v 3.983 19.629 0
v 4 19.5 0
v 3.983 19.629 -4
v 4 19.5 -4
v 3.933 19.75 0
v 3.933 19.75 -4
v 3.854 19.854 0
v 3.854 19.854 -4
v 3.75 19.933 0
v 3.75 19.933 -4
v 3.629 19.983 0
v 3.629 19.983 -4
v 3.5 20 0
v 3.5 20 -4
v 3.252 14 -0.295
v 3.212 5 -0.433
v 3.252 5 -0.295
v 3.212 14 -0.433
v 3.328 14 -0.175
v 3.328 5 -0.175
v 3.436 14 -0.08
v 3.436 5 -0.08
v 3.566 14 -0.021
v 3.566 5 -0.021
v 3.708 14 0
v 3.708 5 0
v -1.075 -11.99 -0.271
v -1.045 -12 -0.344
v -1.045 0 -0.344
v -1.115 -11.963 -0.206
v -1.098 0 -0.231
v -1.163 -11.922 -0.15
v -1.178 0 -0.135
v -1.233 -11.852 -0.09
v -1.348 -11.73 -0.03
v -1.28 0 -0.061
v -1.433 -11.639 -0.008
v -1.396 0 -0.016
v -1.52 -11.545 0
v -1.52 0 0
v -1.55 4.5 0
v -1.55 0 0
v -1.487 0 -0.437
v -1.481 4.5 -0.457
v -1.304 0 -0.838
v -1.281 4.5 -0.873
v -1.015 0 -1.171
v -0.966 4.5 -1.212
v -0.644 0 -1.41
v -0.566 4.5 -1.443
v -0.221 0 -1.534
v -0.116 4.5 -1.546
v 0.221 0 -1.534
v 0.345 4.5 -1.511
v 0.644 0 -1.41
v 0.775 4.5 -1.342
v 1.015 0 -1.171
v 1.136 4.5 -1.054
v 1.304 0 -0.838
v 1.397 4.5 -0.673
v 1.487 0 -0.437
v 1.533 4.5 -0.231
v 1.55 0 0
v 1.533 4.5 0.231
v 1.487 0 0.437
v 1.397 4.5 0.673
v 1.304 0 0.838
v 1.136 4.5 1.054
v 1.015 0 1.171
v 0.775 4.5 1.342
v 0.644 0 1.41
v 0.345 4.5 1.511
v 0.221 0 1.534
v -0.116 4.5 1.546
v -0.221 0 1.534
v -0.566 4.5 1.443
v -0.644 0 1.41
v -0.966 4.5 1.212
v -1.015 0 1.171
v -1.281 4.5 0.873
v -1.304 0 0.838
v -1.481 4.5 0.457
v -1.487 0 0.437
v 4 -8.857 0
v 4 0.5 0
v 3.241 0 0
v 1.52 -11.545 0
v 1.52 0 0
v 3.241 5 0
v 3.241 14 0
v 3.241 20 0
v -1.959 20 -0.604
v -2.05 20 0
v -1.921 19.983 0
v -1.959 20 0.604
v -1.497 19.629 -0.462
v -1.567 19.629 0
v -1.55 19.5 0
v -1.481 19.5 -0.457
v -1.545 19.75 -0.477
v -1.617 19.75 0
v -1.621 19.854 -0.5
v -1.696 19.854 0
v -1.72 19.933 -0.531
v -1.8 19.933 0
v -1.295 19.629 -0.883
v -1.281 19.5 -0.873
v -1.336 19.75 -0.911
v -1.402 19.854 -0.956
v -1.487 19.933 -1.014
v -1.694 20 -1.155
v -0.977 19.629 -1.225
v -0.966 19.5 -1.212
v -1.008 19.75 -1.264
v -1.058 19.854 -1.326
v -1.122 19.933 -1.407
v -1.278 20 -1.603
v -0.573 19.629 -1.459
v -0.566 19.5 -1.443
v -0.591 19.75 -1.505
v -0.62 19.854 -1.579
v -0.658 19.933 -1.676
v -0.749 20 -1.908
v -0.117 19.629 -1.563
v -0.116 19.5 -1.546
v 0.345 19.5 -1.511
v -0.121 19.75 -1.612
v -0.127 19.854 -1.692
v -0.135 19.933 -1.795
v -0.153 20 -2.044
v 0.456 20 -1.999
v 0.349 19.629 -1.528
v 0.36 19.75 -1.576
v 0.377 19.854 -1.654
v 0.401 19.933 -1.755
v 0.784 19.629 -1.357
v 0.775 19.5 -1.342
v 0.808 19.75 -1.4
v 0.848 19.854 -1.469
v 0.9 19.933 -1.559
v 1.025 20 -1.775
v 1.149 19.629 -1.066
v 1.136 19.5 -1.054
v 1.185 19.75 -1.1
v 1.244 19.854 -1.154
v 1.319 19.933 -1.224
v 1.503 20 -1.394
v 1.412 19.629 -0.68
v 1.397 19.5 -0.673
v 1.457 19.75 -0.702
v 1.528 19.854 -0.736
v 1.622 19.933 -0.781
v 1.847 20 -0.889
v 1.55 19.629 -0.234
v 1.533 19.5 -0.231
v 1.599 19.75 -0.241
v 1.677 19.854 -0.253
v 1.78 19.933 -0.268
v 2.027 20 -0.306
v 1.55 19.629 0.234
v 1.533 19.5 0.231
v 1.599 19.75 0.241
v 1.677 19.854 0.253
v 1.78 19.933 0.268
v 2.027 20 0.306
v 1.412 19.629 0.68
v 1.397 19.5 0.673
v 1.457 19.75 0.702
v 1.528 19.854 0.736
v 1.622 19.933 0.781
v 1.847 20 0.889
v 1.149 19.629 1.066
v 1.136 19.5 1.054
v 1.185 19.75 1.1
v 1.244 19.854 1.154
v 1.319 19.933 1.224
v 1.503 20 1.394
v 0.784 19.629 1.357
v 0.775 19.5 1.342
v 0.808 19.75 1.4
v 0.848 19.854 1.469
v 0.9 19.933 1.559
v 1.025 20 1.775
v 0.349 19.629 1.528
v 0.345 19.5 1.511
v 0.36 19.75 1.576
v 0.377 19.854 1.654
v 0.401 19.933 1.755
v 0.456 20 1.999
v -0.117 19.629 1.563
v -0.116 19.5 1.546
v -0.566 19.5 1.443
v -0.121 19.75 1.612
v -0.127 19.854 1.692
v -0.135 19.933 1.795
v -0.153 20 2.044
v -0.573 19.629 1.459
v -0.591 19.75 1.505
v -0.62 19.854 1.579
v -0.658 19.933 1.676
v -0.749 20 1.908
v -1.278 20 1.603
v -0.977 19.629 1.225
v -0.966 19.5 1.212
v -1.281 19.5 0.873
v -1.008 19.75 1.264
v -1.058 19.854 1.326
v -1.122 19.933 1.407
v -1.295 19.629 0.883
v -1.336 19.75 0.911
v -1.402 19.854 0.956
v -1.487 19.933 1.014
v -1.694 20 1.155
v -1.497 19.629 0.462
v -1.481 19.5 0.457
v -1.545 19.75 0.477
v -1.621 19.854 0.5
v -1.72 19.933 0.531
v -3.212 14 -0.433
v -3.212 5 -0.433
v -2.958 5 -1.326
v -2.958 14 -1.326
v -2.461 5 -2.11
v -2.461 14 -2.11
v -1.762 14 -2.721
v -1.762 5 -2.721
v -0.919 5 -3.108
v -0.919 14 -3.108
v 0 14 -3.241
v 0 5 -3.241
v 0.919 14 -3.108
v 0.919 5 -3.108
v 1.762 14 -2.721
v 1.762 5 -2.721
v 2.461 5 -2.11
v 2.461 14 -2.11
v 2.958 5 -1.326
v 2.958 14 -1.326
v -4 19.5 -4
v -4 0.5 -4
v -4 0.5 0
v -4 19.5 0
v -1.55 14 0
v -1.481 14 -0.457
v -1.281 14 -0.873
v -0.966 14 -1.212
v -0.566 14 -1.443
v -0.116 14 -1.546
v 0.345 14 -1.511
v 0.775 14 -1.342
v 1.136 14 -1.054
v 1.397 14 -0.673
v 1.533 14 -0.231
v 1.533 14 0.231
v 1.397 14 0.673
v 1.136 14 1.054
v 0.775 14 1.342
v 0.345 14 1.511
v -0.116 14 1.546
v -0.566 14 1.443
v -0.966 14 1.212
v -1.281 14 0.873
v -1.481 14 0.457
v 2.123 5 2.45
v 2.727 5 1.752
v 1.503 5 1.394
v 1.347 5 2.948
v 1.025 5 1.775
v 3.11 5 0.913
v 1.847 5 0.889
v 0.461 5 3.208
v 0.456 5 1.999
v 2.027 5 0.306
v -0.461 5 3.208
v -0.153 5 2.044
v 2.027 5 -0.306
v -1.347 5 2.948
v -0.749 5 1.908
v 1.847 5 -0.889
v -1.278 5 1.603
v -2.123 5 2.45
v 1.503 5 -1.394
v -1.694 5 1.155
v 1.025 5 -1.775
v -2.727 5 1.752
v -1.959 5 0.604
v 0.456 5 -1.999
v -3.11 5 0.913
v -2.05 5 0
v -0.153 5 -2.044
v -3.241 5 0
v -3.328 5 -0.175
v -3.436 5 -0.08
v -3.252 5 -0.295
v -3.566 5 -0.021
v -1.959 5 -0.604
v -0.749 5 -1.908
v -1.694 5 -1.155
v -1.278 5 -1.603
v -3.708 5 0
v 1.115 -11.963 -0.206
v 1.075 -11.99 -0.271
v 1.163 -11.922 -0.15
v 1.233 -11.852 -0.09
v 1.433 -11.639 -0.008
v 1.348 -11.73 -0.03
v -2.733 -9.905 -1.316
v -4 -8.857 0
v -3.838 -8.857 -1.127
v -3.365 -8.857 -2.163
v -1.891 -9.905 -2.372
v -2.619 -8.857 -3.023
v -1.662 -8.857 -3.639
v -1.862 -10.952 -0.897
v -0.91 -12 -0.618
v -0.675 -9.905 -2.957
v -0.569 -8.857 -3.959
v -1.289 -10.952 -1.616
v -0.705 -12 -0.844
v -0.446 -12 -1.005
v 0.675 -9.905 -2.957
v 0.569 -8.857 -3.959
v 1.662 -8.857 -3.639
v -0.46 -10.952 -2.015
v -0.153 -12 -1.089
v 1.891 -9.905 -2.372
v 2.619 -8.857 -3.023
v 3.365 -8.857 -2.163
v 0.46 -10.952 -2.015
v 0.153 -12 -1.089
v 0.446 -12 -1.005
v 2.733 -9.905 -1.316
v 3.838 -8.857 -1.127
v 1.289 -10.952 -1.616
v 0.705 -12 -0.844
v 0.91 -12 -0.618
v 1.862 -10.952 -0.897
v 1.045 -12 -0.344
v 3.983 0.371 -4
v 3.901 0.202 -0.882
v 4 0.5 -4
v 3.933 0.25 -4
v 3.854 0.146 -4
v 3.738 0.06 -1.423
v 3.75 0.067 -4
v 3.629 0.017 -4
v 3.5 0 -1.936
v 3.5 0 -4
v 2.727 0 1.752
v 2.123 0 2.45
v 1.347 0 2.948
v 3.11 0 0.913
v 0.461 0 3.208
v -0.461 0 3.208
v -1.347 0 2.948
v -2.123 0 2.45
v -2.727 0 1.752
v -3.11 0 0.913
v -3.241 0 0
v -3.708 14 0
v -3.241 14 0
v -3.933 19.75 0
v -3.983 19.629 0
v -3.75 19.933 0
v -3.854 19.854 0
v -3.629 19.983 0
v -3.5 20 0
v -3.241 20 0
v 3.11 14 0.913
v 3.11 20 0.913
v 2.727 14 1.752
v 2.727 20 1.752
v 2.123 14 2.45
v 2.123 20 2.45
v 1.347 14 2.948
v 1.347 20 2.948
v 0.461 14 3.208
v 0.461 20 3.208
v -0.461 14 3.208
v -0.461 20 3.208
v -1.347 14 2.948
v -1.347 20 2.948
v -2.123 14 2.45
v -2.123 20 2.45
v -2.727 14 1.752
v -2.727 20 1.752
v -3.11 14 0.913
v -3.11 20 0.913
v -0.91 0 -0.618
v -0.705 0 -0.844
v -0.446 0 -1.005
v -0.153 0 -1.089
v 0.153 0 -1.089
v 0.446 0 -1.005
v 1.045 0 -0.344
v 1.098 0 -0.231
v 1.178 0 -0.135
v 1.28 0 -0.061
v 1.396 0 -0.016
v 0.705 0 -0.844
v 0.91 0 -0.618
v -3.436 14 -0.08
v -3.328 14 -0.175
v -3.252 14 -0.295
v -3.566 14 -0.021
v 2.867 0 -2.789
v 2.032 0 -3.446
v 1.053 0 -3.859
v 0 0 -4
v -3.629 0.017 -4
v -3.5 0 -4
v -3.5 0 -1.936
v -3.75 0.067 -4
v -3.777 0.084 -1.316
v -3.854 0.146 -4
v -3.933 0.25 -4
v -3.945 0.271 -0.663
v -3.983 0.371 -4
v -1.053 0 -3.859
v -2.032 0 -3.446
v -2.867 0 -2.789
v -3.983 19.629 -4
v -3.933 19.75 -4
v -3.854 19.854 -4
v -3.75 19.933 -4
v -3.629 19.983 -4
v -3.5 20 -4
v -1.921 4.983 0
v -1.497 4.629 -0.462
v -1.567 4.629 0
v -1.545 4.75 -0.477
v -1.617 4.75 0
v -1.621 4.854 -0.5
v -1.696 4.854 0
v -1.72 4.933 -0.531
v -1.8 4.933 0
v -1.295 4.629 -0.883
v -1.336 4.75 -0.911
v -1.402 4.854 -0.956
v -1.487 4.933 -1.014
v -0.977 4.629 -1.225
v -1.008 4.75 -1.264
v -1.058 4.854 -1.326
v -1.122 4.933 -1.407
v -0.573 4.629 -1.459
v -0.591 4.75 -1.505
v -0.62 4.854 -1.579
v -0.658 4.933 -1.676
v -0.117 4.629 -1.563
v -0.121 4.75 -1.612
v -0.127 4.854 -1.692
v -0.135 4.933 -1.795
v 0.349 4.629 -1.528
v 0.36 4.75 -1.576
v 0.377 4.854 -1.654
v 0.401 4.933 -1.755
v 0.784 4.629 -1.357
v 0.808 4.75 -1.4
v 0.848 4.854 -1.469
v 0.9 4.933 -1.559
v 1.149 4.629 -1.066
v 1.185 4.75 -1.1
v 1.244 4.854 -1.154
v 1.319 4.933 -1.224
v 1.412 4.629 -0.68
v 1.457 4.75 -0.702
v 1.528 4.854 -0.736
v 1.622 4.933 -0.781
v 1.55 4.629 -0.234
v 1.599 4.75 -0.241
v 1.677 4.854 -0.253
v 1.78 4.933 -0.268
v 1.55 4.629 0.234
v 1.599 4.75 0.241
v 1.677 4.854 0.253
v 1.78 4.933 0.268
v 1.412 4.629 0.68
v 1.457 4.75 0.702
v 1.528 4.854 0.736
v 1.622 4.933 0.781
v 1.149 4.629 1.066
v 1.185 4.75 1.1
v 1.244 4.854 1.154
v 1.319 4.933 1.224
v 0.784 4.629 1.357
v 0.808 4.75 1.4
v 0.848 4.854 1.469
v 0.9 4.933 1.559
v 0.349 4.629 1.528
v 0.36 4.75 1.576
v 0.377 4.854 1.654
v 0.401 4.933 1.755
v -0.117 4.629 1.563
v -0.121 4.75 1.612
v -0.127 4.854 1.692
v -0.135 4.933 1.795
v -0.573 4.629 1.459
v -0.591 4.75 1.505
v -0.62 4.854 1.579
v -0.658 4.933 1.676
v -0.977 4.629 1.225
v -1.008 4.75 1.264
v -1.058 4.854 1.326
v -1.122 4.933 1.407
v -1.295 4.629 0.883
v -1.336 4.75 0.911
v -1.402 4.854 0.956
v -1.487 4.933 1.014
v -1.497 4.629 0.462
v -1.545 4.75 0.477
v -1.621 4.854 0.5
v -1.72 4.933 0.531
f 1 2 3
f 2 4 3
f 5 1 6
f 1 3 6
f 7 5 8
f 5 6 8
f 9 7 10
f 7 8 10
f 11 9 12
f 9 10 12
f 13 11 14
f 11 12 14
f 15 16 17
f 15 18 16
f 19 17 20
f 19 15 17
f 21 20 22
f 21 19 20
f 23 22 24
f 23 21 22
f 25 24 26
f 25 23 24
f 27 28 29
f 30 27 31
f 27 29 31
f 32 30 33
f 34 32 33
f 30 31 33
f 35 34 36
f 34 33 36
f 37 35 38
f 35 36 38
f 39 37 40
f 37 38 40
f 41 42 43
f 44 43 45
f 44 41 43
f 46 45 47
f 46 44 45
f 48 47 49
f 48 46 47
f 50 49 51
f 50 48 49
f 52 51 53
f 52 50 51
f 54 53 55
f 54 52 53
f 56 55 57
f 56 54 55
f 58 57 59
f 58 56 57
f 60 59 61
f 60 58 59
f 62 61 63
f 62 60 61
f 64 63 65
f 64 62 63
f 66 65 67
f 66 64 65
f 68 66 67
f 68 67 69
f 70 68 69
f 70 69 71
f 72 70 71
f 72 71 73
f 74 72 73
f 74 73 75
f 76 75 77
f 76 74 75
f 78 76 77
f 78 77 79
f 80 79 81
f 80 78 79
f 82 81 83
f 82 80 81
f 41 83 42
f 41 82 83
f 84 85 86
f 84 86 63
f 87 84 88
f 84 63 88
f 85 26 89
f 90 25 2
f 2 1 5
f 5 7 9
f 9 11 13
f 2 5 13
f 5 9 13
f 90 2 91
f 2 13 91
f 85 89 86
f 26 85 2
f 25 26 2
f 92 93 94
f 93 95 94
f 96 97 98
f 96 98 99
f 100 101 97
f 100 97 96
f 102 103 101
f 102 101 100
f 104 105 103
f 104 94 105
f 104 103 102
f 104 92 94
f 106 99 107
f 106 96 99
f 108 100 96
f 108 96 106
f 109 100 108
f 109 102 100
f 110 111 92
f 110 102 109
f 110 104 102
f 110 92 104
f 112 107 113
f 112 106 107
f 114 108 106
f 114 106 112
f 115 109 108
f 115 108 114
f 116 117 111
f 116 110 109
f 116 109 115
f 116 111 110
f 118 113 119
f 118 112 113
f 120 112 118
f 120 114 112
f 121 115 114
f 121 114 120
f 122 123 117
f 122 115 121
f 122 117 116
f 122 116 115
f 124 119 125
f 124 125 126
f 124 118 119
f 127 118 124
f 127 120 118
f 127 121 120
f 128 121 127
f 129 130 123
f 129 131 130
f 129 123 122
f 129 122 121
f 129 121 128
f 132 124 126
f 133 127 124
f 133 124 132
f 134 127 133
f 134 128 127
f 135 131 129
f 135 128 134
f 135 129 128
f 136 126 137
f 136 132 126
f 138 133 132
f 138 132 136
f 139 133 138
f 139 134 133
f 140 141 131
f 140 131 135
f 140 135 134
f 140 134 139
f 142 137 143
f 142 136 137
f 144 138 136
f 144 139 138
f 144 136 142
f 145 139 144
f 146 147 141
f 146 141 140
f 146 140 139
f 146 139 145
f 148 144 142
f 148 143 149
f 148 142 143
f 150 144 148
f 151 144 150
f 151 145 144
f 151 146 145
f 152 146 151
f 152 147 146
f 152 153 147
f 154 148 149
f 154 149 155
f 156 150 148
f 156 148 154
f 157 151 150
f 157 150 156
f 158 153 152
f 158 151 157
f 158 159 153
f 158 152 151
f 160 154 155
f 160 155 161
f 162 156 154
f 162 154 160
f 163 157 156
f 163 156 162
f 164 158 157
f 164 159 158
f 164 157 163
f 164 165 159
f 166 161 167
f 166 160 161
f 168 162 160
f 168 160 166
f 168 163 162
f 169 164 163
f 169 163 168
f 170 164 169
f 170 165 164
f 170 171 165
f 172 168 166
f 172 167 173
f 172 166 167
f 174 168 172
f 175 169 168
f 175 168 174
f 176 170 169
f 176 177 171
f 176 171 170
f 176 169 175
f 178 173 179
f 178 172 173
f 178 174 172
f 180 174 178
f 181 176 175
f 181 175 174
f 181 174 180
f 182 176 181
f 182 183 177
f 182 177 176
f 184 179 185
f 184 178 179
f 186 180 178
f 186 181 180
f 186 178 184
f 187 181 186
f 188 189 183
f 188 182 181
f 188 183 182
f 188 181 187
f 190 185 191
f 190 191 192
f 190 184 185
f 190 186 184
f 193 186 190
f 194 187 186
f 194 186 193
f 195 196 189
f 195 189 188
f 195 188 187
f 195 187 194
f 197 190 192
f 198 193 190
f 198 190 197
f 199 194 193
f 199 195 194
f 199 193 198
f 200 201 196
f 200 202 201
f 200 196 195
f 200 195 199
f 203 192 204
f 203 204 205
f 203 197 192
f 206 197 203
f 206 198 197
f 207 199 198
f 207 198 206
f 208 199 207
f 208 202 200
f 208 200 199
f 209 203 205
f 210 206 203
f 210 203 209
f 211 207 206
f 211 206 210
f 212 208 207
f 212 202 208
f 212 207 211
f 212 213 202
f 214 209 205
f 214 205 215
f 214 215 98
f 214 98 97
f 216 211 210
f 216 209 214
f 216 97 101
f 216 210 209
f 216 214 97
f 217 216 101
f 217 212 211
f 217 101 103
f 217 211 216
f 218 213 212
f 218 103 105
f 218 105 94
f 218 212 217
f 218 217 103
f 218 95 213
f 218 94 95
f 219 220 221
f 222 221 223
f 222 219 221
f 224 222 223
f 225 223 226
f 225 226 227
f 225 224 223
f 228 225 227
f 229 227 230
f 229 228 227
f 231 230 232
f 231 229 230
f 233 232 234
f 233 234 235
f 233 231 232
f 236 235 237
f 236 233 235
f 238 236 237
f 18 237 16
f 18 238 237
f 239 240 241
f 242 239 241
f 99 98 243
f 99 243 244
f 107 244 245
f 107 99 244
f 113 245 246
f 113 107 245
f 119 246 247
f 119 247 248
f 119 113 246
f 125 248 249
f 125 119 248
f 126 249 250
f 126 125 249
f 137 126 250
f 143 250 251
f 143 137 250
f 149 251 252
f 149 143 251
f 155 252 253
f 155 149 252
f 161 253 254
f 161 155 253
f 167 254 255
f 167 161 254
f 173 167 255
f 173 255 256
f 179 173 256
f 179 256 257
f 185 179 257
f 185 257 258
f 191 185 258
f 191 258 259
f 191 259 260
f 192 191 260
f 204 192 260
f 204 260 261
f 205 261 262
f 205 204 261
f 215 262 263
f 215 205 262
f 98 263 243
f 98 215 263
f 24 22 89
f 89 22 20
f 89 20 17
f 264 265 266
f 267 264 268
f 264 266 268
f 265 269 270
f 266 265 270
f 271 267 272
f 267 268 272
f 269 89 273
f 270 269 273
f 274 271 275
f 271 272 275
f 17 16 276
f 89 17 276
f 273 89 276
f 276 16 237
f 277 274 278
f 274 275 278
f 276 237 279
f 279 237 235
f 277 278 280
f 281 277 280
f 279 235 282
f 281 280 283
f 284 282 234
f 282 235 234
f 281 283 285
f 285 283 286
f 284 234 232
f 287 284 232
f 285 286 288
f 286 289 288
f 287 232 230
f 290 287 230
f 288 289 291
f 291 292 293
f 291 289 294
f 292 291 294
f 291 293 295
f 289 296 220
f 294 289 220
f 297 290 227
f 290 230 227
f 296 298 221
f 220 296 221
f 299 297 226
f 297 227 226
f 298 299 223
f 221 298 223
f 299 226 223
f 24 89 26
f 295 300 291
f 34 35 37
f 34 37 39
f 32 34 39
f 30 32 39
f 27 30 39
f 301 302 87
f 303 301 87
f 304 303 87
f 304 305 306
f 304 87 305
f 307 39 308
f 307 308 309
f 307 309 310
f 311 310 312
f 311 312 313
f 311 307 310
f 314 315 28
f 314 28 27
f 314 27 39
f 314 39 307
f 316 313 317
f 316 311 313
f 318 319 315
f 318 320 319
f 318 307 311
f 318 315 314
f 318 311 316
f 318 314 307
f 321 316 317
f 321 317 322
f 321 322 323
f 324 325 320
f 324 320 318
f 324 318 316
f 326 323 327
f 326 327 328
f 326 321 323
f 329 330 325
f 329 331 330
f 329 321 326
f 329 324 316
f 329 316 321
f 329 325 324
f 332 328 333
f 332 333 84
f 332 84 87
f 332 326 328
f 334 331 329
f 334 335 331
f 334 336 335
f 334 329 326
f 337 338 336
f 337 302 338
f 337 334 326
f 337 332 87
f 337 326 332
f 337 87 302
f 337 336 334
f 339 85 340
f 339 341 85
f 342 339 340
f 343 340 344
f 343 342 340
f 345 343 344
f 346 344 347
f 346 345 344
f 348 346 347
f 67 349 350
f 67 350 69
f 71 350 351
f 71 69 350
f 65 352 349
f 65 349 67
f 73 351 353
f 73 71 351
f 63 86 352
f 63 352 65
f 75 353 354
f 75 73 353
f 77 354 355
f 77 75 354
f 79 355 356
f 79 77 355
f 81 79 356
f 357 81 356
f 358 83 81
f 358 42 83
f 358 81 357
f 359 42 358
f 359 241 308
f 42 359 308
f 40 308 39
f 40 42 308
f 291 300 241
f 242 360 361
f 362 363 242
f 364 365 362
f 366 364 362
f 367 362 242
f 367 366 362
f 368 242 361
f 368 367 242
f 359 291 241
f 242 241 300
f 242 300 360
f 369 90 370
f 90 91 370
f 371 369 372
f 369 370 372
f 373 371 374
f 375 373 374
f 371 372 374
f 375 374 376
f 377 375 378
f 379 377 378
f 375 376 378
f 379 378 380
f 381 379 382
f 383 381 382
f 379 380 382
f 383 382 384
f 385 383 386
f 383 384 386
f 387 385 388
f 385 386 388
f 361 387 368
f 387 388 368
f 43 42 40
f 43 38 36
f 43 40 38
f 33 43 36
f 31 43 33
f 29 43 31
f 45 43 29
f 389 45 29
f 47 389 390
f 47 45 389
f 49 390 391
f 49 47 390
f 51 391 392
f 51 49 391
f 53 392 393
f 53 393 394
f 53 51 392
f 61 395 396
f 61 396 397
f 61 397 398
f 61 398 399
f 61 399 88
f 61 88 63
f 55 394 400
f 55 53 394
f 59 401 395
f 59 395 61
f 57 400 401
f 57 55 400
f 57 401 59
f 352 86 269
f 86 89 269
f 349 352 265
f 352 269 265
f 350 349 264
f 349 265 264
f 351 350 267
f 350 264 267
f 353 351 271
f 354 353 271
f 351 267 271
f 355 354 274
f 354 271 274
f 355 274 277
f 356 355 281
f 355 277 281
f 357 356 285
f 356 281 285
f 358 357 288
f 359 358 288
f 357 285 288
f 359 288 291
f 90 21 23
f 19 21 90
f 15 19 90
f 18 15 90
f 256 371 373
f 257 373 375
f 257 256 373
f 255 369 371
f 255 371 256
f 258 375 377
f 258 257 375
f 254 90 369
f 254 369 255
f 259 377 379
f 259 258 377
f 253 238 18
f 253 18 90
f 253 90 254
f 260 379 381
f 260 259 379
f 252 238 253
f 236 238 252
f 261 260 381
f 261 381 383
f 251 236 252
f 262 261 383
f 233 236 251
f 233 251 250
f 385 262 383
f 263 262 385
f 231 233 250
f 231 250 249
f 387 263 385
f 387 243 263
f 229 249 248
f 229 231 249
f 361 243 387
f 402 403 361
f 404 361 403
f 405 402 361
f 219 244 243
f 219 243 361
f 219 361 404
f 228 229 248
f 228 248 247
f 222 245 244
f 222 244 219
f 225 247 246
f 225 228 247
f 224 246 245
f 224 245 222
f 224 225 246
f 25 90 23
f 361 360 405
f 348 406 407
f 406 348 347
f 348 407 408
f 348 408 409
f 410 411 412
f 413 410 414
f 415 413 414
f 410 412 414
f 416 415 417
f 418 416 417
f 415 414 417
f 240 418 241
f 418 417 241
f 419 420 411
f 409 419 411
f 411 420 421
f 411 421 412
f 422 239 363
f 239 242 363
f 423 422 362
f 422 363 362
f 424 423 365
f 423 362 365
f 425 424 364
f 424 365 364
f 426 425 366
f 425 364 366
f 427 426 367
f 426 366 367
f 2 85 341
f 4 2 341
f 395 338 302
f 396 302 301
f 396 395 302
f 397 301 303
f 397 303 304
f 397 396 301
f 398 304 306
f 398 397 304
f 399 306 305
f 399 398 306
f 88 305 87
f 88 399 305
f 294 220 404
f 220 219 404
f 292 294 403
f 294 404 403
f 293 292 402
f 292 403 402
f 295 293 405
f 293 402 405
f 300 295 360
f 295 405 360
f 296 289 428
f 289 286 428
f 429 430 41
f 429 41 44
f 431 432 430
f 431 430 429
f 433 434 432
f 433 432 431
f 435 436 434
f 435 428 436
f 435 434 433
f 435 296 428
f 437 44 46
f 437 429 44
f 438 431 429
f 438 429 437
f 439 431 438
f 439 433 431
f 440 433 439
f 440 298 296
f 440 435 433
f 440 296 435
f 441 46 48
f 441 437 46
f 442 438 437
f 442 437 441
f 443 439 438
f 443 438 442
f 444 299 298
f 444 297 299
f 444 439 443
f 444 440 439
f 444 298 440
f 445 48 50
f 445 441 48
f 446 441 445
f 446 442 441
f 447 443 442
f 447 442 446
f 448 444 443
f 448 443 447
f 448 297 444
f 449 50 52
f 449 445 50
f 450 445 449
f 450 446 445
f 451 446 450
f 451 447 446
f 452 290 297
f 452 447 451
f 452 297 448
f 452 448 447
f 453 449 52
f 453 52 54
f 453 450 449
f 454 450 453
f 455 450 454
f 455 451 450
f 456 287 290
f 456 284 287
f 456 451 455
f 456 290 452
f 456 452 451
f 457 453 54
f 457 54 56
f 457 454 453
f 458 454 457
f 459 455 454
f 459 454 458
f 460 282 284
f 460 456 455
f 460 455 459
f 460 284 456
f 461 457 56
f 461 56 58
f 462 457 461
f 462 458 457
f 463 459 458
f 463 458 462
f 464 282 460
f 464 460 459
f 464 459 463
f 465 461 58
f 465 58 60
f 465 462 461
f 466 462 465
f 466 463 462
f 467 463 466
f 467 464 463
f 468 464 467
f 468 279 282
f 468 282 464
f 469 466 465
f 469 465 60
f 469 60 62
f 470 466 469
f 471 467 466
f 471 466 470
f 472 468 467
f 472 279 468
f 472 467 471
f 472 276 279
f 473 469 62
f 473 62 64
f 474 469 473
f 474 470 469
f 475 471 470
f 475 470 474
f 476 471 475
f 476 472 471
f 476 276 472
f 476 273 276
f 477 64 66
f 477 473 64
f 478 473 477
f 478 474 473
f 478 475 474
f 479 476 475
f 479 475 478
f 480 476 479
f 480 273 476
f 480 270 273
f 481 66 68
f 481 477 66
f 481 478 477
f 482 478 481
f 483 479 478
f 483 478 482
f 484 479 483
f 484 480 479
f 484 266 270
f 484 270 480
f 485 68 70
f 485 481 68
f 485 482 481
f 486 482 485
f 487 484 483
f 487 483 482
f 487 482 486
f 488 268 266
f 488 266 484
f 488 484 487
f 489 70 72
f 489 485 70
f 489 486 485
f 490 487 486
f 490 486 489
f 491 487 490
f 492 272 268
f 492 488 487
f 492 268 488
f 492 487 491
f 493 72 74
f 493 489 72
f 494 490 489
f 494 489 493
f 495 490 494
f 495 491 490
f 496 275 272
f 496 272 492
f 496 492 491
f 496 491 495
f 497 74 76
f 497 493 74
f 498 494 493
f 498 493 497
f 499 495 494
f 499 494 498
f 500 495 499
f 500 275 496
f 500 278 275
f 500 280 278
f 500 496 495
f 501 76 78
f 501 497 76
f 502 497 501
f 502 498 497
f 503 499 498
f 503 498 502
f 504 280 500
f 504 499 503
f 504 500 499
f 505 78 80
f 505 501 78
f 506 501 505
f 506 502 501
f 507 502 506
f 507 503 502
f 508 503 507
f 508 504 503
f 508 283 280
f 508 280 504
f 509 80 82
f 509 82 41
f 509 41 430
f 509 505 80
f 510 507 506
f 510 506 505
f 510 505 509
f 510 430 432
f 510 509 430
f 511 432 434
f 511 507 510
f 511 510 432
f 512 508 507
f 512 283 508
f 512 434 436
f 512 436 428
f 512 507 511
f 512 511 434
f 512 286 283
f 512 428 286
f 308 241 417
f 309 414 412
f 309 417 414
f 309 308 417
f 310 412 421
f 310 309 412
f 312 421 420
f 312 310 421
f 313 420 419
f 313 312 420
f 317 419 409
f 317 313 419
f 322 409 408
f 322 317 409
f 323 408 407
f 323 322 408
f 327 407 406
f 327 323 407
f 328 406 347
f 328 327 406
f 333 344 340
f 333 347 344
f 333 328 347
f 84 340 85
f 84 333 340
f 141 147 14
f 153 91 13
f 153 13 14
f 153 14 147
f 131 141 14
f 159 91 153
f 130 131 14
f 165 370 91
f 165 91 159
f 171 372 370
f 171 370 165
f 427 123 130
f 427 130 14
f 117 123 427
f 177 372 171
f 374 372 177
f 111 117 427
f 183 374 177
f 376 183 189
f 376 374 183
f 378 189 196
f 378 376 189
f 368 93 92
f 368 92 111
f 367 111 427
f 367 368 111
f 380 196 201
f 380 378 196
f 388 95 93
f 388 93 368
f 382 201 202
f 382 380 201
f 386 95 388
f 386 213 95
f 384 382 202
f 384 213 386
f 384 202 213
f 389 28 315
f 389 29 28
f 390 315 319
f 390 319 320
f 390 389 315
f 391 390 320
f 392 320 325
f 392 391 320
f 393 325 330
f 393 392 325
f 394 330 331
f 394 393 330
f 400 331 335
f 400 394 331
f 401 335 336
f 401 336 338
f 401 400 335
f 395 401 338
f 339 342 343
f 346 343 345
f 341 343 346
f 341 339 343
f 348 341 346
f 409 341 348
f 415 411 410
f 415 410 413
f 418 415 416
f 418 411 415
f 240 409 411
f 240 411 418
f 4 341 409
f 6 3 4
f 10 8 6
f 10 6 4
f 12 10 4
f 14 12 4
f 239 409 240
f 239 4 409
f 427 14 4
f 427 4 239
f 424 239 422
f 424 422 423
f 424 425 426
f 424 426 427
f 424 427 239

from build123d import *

# Parameters (mm, degrees)
F0_W     = 0.7586409766
F0_H     = 4.9999998882
F0_H_2   = 9
F0_H_3   = 6.0000001118
F1_ANGLE = 180
F0_W_2   = 1.6913590234
F4_DEPTH = 20
F5_R     = 0.5


with BuildPart() as f1:
    # F0 (on Top) → F1 (revolve)
    with BuildSketch(Plane.XY):
        Polygon((-4, -8.8572846726), (-1.1, -12), (-1.1, 0), (-1.55, 0), (-3.2413590234, 0), (-4, 0), align=None)
        with Locations((-3.6206795117, 2.4999999441)):
            Rectangle(F0_W, F0_H)
        with Locations((-3.6206795117, 9.4999998882)):
            Rectangle(F0_W, F0_H_2)
        with Locations((-3.6206795117, 16.9999999441)):
            Rectangle(F0_W, F0_H_3)
    revolve(axis=Axis((0, 4.4247480631, 0), (0, -1, 0)), revolution_arc=F1_ANGLE)

    # F0 (on Top) → F2 (revolve)
    with BuildSketch(Plane.XY):
        with Locations((-2.3956795117, 2.4999999441)):
            Rectangle(F0_W_2, F0_H)
        with Locations((-2.3956795117, 16.9999999441)):
            Rectangle(F0_W_2, F0_H_3)
    revolve(axis=Axis((0, 4.4247480631, 0), (0, -1, 0)))

    # F3 (on face) → F4 (join)
    with BuildSketch(Plane(origin=(0, 20, 0), x_dir=(-1, 0, 0), z_dir=(0, 1, 0))):
        with BuildLine():
            ThreePointArc((0, -4), (-2.8284271247, -2.8284271247), (-4, 0))
            Line((-4, 0), (-4, -4))
            Line((-4, -4), (0, -4))
        make_face()
        with BuildLine():
            ThreePointArc((4, 0), (2.8284271247, -2.8284271247), (0, -4))
            Line((0, -4), (4, -4))
            Line((4, -4), (4, 0))
        make_face()
    extrude(amount=-F4_DEPTH)

    # F5
    f5_edges = [f1.edges().sort_by_distance(p)[0] for p in [
        (1.1, -6, 0),
        (-1.1, -6, 0),
        (1.55, 5, 0),
        (1.55, 20, 0),
        (3.241359, 9.5, 0),
        (-3.241359, 9.5, 0),
        (4, 20, -2),
        (-4, 20, -2),
        (4, 0, -2),
        (-4, 0, -2),
    ]]
    fillet(f5_edges, radius=F5_R)


solid = f1.part
